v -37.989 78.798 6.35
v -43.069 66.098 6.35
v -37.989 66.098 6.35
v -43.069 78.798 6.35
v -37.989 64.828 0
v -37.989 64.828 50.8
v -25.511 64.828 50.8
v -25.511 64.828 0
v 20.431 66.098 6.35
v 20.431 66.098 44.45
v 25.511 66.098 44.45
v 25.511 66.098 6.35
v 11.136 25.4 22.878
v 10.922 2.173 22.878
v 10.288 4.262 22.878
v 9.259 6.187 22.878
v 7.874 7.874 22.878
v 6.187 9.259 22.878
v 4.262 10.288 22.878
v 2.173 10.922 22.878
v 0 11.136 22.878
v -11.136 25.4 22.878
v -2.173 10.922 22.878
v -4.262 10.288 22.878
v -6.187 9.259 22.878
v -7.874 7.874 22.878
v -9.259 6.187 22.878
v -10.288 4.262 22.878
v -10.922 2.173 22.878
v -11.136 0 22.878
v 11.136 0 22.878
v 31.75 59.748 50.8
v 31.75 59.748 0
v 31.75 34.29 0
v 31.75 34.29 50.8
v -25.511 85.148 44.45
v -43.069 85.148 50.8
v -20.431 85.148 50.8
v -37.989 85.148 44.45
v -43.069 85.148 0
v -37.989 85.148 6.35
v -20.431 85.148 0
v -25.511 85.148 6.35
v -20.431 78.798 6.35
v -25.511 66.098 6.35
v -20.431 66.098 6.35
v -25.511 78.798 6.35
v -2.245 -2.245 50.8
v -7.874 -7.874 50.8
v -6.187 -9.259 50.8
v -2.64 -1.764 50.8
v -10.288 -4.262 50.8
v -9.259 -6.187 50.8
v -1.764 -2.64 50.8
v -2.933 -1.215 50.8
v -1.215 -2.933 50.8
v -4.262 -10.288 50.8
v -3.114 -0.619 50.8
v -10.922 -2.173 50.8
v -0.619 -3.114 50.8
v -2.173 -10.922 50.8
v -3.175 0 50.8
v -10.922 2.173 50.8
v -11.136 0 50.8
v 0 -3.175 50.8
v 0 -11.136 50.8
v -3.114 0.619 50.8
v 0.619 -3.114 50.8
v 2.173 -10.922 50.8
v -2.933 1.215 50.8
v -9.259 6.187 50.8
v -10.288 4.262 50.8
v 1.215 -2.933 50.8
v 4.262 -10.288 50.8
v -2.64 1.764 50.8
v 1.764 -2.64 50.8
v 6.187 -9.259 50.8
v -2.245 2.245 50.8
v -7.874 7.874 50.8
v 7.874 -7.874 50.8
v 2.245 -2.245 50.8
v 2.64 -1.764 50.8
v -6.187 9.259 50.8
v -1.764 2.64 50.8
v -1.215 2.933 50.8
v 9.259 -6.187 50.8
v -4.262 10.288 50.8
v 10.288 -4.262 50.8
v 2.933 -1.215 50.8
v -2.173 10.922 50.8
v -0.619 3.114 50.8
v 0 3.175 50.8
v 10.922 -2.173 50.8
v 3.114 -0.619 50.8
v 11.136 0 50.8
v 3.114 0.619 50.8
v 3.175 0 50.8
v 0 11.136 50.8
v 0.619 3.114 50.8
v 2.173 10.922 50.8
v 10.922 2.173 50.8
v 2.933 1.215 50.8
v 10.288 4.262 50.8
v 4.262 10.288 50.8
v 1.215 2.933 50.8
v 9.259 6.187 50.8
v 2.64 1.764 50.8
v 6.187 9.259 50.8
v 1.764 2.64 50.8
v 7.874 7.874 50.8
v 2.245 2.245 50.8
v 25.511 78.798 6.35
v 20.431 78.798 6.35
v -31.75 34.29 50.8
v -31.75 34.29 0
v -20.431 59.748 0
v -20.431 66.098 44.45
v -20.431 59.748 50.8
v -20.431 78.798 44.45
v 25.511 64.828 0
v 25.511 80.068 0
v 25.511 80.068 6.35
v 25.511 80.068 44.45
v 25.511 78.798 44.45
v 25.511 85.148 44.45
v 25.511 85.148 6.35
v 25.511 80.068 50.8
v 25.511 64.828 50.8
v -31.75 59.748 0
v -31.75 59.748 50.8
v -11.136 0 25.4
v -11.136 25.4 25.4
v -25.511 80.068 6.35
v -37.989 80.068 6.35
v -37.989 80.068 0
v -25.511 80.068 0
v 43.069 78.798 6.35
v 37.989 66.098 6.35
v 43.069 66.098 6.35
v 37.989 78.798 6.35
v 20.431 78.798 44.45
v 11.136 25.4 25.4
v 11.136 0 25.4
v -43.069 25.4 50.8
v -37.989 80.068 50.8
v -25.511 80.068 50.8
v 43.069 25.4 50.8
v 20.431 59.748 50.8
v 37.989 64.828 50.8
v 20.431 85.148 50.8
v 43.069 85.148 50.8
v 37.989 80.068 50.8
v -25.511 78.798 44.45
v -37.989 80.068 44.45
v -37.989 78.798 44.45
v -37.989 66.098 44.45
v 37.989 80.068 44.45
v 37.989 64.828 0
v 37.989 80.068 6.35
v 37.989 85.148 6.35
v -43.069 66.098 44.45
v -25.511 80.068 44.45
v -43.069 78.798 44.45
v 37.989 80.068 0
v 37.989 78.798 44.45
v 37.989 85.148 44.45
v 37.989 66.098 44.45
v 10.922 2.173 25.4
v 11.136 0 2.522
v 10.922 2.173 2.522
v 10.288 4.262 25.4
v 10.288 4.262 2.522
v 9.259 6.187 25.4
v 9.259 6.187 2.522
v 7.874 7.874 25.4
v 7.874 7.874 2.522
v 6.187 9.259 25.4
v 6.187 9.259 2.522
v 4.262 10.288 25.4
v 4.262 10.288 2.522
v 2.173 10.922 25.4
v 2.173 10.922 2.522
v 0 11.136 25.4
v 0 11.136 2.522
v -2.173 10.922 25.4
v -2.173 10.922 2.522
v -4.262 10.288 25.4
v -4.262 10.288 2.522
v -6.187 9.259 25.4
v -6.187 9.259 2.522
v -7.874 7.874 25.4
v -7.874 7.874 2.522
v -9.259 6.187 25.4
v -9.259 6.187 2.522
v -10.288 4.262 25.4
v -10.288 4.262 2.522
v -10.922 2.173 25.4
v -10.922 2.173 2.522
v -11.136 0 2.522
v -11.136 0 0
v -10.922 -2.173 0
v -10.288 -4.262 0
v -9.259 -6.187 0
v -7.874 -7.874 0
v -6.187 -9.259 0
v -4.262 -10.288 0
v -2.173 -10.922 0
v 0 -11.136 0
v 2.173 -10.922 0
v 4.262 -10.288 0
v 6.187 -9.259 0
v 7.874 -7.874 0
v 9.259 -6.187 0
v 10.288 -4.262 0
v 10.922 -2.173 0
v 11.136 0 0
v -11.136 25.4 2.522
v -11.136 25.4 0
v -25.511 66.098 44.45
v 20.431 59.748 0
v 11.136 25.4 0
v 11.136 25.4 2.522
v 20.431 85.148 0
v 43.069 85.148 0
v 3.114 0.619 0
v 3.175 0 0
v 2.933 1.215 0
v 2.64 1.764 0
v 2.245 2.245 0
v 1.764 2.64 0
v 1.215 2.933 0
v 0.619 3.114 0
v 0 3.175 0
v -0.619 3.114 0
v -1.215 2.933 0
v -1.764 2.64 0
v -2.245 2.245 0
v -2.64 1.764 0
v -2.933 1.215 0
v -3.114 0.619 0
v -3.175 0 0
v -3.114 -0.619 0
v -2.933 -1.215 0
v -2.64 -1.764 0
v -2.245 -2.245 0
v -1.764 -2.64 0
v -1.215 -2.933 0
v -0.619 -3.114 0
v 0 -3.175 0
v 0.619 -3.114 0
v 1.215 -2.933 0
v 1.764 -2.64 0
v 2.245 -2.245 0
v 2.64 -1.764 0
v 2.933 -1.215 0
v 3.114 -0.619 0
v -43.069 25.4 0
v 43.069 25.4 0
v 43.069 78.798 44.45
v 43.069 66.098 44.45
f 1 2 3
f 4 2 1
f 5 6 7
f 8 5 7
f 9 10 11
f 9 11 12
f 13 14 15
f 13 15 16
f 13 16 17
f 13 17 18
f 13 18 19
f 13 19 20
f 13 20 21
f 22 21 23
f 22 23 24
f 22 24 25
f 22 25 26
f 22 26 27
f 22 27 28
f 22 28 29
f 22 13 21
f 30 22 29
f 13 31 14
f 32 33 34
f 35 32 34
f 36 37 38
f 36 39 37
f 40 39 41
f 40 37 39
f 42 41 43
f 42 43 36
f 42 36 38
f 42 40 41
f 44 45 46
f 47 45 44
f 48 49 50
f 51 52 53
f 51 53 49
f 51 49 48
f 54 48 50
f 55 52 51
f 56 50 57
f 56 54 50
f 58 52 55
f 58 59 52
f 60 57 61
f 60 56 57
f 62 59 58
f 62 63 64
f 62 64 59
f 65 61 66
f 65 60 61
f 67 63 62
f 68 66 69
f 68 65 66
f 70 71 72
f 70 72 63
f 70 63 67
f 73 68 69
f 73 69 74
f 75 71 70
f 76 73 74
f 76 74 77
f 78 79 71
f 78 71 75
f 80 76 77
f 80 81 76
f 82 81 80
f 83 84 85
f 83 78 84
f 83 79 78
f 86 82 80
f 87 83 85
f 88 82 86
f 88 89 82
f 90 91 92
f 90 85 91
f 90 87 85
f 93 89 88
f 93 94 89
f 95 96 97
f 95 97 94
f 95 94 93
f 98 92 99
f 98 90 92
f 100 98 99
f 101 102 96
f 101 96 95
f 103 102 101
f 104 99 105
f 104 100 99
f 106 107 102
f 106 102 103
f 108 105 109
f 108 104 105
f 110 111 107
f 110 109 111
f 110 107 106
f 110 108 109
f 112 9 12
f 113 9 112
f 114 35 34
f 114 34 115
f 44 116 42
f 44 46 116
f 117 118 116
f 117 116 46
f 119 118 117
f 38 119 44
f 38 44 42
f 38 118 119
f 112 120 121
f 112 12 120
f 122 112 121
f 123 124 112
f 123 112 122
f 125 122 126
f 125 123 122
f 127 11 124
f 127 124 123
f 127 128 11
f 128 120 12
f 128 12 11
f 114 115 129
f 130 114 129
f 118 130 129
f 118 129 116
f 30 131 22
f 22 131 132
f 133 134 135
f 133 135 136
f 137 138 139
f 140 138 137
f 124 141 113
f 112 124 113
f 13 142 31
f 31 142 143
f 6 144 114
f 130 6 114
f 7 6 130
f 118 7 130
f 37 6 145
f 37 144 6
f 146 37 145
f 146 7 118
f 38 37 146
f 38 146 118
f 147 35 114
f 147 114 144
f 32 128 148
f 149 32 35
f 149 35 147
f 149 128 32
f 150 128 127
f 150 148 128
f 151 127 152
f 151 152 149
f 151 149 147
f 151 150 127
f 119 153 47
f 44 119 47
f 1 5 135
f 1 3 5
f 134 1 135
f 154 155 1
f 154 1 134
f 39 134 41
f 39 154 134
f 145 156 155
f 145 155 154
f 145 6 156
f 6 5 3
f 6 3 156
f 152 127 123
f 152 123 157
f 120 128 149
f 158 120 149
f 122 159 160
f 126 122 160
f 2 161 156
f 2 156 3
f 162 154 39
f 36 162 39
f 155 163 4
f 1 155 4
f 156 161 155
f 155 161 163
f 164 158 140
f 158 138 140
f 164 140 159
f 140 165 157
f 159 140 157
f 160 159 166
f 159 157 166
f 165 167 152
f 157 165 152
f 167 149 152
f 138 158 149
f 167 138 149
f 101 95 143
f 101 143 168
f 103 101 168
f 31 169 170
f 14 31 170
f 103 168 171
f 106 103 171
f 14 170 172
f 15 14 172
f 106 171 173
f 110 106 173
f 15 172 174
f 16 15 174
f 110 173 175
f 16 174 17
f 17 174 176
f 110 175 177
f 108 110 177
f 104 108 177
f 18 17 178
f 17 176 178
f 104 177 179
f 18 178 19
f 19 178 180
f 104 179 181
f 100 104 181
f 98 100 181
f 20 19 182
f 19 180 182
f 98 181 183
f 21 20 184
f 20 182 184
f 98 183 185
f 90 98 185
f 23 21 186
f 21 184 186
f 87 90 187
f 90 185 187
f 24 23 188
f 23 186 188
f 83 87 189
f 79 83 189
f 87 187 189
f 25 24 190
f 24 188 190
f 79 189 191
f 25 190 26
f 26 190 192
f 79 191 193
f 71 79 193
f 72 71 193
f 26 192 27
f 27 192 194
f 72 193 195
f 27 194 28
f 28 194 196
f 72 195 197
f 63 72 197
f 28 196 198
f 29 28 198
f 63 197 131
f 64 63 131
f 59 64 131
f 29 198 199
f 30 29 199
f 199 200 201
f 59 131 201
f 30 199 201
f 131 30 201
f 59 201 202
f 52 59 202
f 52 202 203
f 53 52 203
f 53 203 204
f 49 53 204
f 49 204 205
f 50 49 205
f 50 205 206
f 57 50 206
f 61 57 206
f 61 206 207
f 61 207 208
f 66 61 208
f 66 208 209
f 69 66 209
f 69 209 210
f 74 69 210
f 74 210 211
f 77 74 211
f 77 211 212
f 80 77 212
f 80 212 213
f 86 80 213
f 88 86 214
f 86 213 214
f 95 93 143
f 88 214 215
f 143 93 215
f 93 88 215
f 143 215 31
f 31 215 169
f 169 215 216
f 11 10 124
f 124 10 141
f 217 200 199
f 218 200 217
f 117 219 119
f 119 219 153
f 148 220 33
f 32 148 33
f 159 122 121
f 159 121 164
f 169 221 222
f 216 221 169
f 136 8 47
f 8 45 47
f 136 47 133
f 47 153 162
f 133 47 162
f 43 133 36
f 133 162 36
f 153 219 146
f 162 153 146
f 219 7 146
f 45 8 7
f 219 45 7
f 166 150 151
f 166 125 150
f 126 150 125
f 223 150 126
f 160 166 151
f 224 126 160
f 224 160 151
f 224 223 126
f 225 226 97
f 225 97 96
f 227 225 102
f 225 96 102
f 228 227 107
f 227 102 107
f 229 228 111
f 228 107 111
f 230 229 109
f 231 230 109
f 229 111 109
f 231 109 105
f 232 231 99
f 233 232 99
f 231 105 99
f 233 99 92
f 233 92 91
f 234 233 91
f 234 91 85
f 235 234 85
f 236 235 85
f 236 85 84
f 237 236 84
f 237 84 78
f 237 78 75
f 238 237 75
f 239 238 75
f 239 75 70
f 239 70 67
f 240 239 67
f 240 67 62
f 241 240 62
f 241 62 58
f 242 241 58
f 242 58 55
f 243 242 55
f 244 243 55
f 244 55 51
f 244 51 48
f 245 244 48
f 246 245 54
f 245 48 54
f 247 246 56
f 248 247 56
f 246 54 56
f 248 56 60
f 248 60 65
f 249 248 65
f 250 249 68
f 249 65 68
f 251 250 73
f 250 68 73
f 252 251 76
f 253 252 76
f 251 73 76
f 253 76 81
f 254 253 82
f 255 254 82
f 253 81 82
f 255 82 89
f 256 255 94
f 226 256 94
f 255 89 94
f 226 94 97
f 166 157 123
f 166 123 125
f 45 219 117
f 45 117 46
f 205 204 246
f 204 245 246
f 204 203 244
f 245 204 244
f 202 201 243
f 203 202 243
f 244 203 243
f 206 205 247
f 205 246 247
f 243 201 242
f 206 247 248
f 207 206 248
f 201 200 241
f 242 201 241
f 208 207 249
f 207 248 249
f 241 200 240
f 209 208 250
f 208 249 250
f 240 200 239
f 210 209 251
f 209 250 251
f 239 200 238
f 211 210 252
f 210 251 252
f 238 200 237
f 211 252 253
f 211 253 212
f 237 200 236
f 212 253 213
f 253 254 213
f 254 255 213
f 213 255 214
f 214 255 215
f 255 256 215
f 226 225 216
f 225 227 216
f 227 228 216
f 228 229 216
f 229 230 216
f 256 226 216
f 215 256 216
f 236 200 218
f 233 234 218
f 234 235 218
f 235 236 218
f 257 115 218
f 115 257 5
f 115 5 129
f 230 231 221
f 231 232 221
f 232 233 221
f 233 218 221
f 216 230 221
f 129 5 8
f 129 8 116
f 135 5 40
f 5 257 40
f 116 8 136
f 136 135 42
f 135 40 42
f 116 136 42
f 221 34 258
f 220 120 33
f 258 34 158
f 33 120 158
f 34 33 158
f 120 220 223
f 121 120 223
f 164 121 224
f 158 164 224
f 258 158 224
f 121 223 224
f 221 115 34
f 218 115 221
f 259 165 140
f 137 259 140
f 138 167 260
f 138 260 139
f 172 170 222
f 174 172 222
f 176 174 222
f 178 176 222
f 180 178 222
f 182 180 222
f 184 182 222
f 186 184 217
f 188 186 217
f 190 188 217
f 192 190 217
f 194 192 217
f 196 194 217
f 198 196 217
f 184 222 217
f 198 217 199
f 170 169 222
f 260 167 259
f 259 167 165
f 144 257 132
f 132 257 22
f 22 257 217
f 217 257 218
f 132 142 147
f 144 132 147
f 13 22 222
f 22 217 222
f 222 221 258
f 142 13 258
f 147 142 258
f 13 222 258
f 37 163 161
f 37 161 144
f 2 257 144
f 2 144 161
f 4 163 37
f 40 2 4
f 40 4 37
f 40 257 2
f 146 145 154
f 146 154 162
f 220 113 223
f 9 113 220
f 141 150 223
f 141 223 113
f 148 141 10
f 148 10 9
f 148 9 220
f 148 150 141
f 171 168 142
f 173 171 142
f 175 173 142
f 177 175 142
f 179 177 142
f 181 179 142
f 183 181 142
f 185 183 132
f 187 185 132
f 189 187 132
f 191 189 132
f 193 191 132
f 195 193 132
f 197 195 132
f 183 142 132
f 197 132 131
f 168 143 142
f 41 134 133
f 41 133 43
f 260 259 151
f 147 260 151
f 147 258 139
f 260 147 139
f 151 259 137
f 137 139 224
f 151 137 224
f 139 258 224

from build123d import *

# Parameters (mm, degrees)
BOSS_EXTRUDE1_DEPTH            = 2.521826736
SKETCH2_R                      = 11.136118556
BOSS_EXTRUDE2_DEPTH            = 50.8
SKETCH3_W                      = 86.137031446
SKETCH3_H                      = 59.748072355
BOSS_EXTRUDE3_DEPTH            = 50.8
CUT_EXTRUDE1_DEPTH             = 109.100560925
CUT_EXTRUDE2_REACH             = 110.101
SKETCH6_R                      = 3.175
CUT_EXTRUDE3_DEPTH             = 118.741599385
CUT_EXTRUDE3_DEPTH_BACK        = 118.741599385
SKETCH8_W                      = 38.1
SKETCH8_H                      = 12.7
CUT_EXTRUDE4_REACH             = 119.073
SKETCH9_W                      = 12.477031446
SKETCH9_H                      = 38.1
CUT_EXTRUDE4_DIRECTION_2_DEPTH = 118.073406314
SKETCH10_W                     = 12.477031446
SKETCH10_H                     = 15.24
CUT_EXTRUDE5_DEPTH             = 109.100560925


with BuildPart() as part:
    # Sketch1 → Boss-Extrude1 (new body)
    with BuildSketch(Plane.XY):
        with BuildLine():
            Line((-11.136118556, 0), (-11.136118556, 25.4))
            Line((-11.136118556, 25.4), (11.136118556, 25.4))
            Line((11.136118556, 25.4), (11.136118556, 0))
            ThreePointArc((11.136118556, 0), (0, 11.136118556), (-11.136118556, 0))
        make_face()
    boss_extrude1 = extrude(amount=BOSS_EXTRUDE1_DEPTH)

    # Sketch2 → Boss-Extrude2 (add)
    with BuildSketch(Plane.XY):
        Circle(SKETCH2_R)
    extrude(amount=BOSS_EXTRUDE2_DEPTH)

    # Sketch3 → Boss-Extrude3 (add)
    with BuildSketch(Plane.XY):
        with Locations((0, 55.274036178)):
            Rectangle(SKETCH3_W, SKETCH3_H)
    extrude(amount=BOSS_EXTRUDE3_DEPTH)

    # Sketch4 → Cut-Extrude1 (cut, through all)
    with BuildSketch(Plane.XY.offset(50.8)):
        Polygon((20.431484277, 85.148072355), (20.431484277, 59.748072355), (31.75, 59.748072355), (31.75, 34.29), (-31.75, 34.29), (-31.75, 59.748072355), (-20.431484277, 59.748072355), (-20.431484277, 85.148072355), align=None)
    extrude(amount=-CUT_EXTRUDE1_DEPTH, mode=Mode.SUBTRACT)

    # Mirror1: Boss-Extrude1 across plane
    add(boss_extrude1.mirror(Plane(origin=(0, 0, 12.7), x_dir=(1, 0, 0), z_dir=(0, 0, -1))))

    # Sketch6 → Cut-Extrude2 (cut, up to next)
    with BuildSketch(Plane.XY.offset(50.8), mode=Mode.PRIVATE) as cut_extrude2_sk1:
        Circle(SKETCH6_R)
    cut_extrude2_tool1 = extrude(cut_extrude2_sk1.sketch, amount=-CUT_EXTRUDE2_REACH, mode=Mode.PRIVATE) & part.part
    add(cut_extrude2_tool1.solids().sort_by_distance((0, 0, 50.8))[0], mode=Mode.SUBTRACT)

    # Sketch8 → Cut-Extrude3 (cut, two sides: drawn at the far end of the back side and taken through both)
    with BuildSketch(Plane(origin=(-20.431484277, 0, 0), x_dir=(0, 0, -1), z_dir=(1, 0, 0)).offset(-CUT_EXTRUDE3_DEPTH_BACK)):
        with Locations((-25.4, 72.448072355)):
            Rectangle(SKETCH8_W, SKETCH8_H)
    extrude(amount=CUT_EXTRUDE3_DEPTH + CUT_EXTRUDE3_DEPTH_BACK, mode=Mode.SUBTRACT)

    # Sketch9 → Cut-Extrude4 (cut, up to next)
    with BuildSketch(Plane(origin=(0, 85.148072355, 0), x_dir=(1, 0, 0), z_dir=(0, 1, 0)), mode=Mode.PRIVATE) as cut_extrude4_sk1:
        with Locations((-31.75, -25.4)):
            Rectangle(SKETCH9_W, SKETCH9_H)
    cut_extrude4_tool1 = extrude(cut_extrude4_sk1.sketch, amount=-CUT_EXTRUDE4_REACH, mode=Mode.PRIVATE) & part.part
    # Sketch9 → Cut-Extrude4 (cut, up to next)
    with BuildSketch(Plane(origin=(0, 85.148072355, 0), x_dir=(1, 0, 0), z_dir=(0, 1, 0)), mode=Mode.PRIVATE) as cut_extrude4_sk2:
        with Locations((31.75, -25.4)):
            Rectangle(SKETCH9_W, SKETCH9_H)
    cut_extrude4_tool2 = extrude(cut_extrude4_sk2.sketch, amount=-CUT_EXTRUDE4_REACH, mode=Mode.PRIVATE) & part.part
    add(cut_extrude4_tool1.solids().sort_by_distance((-31.75, 85.148072, 25.4))[0], mode=Mode.SUBTRACT)
    add(cut_extrude4_tool2.solids().sort_by_distance((31.75, 85.148072, 25.4))[0], mode=Mode.SUBTRACT)

    # Sketch9 → Cut-Extrude4 direction 2 (cut)
    with BuildSketch(Plane(origin=(0, 85.148072355, 0), x_dir=(1, 0, 0), z_dir=(0, 1, 0))):
        with Locations((-31.75, -25.4)):
            Rectangle(SKETCH9_W, SKETCH9_H)
        with Locations((31.75, -25.4)):
            Rectangle(SKETCH9_W, SKETCH9_H)
    extrude(amount=CUT_EXTRUDE4_DIRECTION_2_DEPTH, mode=Mode.SUBTRACT)

    # Sketch10 → Cut-Extrude5 (cut, through all)
    with BuildSketch(Plane.XY.offset(50.8)):
        with Locations((-31.75, 72.448072355)):
            Rectangle(SKETCH10_W, SKETCH10_H)
        with Locations((31.75, 72.448072355)):
            Rectangle(SKETCH10_W, SKETCH10_H)
    extrude(amount=-CUT_EXTRUDE5_DEPTH, mode=Mode.SUBTRACT)


solid = part.part
